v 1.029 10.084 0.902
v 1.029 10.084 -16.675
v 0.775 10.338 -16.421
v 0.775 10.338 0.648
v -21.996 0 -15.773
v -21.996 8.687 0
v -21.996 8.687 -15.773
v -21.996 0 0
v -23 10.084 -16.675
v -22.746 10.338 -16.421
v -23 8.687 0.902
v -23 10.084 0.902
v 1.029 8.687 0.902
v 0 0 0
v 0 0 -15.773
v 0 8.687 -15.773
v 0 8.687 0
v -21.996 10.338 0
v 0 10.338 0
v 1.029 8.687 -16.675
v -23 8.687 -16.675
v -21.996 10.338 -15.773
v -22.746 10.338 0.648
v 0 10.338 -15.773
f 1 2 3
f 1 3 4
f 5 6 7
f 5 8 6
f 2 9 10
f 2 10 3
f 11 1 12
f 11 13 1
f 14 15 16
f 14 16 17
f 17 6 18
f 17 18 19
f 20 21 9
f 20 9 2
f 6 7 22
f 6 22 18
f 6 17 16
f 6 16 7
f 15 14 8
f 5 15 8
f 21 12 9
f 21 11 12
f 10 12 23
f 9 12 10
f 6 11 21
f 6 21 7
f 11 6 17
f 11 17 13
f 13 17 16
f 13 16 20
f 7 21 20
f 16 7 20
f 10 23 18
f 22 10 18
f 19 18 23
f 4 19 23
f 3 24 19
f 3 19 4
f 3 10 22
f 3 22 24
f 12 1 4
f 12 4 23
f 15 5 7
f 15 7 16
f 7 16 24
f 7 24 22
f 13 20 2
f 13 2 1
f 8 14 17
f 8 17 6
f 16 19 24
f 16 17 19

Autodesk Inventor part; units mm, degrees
ref_plane "YZ Plane" through (0, 0, 0) normal (1, 0, 0) x (0, 1, 0)
ref_plane "XZ Plane" through (0, 0, 0) normal (0, 1, 0) x (-1, 0, 0)
ref_plane "XY Plane" through (0, 0, 0) normal (0, 0, 1) x (1, 0, 0)
sketch "Sketch1" plane through (0, 0, 0) normal (0, 1, 0) x (-1, 0, 0)
  line L0 (0, 0) -> (21.9964, 0)
  line L1 (21.9964, 0) -> (21.9964, -15.7734)
  line L2 (21.9964, -15.7734) -> (0, -15.7734)
  line L3 (0, -15.7734) -> (0, 0)
  dimension "d0" = 21.9964
  dimension "d1" = 15.7734
extrude "Extrusion1" add sketch "Sketch1" along normal blind 8.6868
sketch "Sketch2" plane through (0, 8.6868, 0) normal (0, 1, 0) x (1, 0, 0)
  line L0 (-21.9964, 0) -> (0, 0) projected
  line L1 (0, 0) -> (0, 15.7734) projected
  line L2 (0, 15.7734) -> (-21.9964, 15.7734) projected
  line L3 (-21.9964, 15.7734) -> (-21.9964, 0) projected
  line L4 (-10.9982, 7.8867) -> (-10.9982, 16.6751)
  line L5 (-10.9982, 7.8867) -> (-22.9997, 7.8867)
  line L6 (-22.9997, 16.6751) -> (1.0287, 16.6751)
  line L7 (1.0287, 16.6751) -> (1.0287, -0.9017)
  line L8 (1.0287, -0.9017) -> (-22.9997, -0.9017)
  line L9 (-22.9997, -0.9017) -> (-22.9997, 16.6751)
  dimension "d4" = 8.7884
  dimension "d5" = 12.0015
  dimension "d6" = 24.0284
  dimension "d7" = 17.5768
  dimension "d8" = 0
  dimension "d9" = 7.8867
extrude "Extrusion2" add sketch "Sketch2" along normal blind 1.651 contours L0 L1 L2 L4 L6 L7 L8 L9 L5 L3 | L5 L9 L6 L4 L2 L3
chamfer "Chamfer1" distance 0.254 angle 45 4 edges at (-10.9855, 10.3378, 0.9017) (1.0287, 10.3378, -7.8867) (-10.9855, 10.3378, -16.6751) (-22.9997, 10.3378, -7.8867)
properties part number "LED_BUTTON"
